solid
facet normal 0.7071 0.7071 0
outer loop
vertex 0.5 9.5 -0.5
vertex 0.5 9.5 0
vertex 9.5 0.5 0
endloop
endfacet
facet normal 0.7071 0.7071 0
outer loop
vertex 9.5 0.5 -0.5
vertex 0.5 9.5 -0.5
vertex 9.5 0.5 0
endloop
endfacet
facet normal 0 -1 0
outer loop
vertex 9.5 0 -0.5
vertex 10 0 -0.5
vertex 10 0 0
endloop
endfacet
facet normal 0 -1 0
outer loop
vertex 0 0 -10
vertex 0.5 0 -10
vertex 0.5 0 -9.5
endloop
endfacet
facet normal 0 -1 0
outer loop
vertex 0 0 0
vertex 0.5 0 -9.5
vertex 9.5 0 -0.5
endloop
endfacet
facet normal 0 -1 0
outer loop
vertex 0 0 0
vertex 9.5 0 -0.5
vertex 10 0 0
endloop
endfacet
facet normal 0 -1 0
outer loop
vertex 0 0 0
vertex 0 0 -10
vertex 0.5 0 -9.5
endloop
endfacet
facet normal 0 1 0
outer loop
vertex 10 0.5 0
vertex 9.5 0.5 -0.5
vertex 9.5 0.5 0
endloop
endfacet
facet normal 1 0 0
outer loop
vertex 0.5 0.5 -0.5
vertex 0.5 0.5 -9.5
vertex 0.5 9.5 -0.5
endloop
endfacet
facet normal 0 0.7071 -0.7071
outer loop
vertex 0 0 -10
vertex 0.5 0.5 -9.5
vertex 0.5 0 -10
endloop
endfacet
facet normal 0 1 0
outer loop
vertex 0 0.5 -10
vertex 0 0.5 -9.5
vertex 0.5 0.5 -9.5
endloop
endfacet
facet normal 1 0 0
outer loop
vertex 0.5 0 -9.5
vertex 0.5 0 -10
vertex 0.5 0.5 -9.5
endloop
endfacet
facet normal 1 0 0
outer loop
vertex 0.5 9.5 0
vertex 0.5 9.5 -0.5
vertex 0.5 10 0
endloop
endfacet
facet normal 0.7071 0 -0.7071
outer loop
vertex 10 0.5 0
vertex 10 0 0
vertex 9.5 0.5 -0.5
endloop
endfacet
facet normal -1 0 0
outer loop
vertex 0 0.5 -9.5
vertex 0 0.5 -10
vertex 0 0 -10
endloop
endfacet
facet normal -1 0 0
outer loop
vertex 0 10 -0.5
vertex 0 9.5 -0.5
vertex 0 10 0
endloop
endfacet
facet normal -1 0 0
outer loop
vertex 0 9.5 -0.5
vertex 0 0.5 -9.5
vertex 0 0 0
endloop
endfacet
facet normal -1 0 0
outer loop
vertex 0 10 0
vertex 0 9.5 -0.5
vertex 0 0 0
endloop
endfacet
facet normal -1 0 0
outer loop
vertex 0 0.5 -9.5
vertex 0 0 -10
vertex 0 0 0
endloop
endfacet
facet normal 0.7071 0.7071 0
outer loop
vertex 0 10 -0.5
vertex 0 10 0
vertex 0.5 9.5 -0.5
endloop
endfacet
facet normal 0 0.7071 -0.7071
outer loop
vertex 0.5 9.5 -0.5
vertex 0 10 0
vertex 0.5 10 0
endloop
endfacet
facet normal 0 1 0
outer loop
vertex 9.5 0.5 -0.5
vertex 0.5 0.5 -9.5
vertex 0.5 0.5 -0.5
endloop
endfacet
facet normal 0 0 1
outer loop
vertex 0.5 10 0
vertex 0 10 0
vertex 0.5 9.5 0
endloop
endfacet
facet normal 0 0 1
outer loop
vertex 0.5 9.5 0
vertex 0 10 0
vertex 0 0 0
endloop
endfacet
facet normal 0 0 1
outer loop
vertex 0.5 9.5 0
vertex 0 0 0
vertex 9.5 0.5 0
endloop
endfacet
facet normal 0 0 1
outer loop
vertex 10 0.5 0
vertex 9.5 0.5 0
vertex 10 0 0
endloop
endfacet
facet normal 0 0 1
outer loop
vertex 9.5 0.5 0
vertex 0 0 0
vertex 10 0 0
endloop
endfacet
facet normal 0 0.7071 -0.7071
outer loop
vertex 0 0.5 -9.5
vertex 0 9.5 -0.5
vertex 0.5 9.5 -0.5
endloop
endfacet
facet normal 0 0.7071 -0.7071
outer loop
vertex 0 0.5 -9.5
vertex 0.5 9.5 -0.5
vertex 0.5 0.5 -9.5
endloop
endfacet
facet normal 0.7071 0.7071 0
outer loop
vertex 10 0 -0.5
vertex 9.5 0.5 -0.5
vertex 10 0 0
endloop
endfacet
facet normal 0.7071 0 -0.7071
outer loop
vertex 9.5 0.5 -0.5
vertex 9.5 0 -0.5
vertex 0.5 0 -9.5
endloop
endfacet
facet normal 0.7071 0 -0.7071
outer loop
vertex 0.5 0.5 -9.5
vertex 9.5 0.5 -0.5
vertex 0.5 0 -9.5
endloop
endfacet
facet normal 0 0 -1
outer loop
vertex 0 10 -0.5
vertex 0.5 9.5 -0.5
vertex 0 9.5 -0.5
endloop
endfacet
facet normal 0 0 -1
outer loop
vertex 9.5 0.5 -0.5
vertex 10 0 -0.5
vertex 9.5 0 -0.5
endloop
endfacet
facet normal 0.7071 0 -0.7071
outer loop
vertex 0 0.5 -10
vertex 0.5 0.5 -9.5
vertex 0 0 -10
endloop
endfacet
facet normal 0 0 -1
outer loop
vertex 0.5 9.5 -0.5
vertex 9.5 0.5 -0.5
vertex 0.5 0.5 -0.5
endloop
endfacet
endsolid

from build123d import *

# Parameters (mm, degrees)
BOSS_EXTRUDE5_DEPTH = 0.5
BOSS_EXTRUDE6_DEPTH = 0.5
BOSS_EXTRUDE7_DEPTH = 0.5


with BuildPart() as part:
    # Sketch2 → Boss-Extrude5 (new body)
    with BuildSketch(Plane(origin=(0, 0, 0), x_dir=(1, 0, 0), z_dir=(0, 1, 0))):
        Polygon((0, 10), (0, 0), (10, 0), align=None)
    extrude(amount=BOSS_EXTRUDE5_DEPTH)

    # Sketch3 → Boss-Extrude6 (add)
    with BuildSketch(Plane.XY):
        Polygon((0, 0), (0, 10), (10, 0), align=None)
    extrude(amount=-BOSS_EXTRUDE6_DEPTH)

    # Sketch4 → Boss-Extrude7 (add)
    with BuildSketch(Plane.ZY):
        Polygon((-10, 0), (0, 0), (0, 10), align=None)
    extrude(amount=-BOSS_EXTRUDE7_DEPTH)


solid = part.part
